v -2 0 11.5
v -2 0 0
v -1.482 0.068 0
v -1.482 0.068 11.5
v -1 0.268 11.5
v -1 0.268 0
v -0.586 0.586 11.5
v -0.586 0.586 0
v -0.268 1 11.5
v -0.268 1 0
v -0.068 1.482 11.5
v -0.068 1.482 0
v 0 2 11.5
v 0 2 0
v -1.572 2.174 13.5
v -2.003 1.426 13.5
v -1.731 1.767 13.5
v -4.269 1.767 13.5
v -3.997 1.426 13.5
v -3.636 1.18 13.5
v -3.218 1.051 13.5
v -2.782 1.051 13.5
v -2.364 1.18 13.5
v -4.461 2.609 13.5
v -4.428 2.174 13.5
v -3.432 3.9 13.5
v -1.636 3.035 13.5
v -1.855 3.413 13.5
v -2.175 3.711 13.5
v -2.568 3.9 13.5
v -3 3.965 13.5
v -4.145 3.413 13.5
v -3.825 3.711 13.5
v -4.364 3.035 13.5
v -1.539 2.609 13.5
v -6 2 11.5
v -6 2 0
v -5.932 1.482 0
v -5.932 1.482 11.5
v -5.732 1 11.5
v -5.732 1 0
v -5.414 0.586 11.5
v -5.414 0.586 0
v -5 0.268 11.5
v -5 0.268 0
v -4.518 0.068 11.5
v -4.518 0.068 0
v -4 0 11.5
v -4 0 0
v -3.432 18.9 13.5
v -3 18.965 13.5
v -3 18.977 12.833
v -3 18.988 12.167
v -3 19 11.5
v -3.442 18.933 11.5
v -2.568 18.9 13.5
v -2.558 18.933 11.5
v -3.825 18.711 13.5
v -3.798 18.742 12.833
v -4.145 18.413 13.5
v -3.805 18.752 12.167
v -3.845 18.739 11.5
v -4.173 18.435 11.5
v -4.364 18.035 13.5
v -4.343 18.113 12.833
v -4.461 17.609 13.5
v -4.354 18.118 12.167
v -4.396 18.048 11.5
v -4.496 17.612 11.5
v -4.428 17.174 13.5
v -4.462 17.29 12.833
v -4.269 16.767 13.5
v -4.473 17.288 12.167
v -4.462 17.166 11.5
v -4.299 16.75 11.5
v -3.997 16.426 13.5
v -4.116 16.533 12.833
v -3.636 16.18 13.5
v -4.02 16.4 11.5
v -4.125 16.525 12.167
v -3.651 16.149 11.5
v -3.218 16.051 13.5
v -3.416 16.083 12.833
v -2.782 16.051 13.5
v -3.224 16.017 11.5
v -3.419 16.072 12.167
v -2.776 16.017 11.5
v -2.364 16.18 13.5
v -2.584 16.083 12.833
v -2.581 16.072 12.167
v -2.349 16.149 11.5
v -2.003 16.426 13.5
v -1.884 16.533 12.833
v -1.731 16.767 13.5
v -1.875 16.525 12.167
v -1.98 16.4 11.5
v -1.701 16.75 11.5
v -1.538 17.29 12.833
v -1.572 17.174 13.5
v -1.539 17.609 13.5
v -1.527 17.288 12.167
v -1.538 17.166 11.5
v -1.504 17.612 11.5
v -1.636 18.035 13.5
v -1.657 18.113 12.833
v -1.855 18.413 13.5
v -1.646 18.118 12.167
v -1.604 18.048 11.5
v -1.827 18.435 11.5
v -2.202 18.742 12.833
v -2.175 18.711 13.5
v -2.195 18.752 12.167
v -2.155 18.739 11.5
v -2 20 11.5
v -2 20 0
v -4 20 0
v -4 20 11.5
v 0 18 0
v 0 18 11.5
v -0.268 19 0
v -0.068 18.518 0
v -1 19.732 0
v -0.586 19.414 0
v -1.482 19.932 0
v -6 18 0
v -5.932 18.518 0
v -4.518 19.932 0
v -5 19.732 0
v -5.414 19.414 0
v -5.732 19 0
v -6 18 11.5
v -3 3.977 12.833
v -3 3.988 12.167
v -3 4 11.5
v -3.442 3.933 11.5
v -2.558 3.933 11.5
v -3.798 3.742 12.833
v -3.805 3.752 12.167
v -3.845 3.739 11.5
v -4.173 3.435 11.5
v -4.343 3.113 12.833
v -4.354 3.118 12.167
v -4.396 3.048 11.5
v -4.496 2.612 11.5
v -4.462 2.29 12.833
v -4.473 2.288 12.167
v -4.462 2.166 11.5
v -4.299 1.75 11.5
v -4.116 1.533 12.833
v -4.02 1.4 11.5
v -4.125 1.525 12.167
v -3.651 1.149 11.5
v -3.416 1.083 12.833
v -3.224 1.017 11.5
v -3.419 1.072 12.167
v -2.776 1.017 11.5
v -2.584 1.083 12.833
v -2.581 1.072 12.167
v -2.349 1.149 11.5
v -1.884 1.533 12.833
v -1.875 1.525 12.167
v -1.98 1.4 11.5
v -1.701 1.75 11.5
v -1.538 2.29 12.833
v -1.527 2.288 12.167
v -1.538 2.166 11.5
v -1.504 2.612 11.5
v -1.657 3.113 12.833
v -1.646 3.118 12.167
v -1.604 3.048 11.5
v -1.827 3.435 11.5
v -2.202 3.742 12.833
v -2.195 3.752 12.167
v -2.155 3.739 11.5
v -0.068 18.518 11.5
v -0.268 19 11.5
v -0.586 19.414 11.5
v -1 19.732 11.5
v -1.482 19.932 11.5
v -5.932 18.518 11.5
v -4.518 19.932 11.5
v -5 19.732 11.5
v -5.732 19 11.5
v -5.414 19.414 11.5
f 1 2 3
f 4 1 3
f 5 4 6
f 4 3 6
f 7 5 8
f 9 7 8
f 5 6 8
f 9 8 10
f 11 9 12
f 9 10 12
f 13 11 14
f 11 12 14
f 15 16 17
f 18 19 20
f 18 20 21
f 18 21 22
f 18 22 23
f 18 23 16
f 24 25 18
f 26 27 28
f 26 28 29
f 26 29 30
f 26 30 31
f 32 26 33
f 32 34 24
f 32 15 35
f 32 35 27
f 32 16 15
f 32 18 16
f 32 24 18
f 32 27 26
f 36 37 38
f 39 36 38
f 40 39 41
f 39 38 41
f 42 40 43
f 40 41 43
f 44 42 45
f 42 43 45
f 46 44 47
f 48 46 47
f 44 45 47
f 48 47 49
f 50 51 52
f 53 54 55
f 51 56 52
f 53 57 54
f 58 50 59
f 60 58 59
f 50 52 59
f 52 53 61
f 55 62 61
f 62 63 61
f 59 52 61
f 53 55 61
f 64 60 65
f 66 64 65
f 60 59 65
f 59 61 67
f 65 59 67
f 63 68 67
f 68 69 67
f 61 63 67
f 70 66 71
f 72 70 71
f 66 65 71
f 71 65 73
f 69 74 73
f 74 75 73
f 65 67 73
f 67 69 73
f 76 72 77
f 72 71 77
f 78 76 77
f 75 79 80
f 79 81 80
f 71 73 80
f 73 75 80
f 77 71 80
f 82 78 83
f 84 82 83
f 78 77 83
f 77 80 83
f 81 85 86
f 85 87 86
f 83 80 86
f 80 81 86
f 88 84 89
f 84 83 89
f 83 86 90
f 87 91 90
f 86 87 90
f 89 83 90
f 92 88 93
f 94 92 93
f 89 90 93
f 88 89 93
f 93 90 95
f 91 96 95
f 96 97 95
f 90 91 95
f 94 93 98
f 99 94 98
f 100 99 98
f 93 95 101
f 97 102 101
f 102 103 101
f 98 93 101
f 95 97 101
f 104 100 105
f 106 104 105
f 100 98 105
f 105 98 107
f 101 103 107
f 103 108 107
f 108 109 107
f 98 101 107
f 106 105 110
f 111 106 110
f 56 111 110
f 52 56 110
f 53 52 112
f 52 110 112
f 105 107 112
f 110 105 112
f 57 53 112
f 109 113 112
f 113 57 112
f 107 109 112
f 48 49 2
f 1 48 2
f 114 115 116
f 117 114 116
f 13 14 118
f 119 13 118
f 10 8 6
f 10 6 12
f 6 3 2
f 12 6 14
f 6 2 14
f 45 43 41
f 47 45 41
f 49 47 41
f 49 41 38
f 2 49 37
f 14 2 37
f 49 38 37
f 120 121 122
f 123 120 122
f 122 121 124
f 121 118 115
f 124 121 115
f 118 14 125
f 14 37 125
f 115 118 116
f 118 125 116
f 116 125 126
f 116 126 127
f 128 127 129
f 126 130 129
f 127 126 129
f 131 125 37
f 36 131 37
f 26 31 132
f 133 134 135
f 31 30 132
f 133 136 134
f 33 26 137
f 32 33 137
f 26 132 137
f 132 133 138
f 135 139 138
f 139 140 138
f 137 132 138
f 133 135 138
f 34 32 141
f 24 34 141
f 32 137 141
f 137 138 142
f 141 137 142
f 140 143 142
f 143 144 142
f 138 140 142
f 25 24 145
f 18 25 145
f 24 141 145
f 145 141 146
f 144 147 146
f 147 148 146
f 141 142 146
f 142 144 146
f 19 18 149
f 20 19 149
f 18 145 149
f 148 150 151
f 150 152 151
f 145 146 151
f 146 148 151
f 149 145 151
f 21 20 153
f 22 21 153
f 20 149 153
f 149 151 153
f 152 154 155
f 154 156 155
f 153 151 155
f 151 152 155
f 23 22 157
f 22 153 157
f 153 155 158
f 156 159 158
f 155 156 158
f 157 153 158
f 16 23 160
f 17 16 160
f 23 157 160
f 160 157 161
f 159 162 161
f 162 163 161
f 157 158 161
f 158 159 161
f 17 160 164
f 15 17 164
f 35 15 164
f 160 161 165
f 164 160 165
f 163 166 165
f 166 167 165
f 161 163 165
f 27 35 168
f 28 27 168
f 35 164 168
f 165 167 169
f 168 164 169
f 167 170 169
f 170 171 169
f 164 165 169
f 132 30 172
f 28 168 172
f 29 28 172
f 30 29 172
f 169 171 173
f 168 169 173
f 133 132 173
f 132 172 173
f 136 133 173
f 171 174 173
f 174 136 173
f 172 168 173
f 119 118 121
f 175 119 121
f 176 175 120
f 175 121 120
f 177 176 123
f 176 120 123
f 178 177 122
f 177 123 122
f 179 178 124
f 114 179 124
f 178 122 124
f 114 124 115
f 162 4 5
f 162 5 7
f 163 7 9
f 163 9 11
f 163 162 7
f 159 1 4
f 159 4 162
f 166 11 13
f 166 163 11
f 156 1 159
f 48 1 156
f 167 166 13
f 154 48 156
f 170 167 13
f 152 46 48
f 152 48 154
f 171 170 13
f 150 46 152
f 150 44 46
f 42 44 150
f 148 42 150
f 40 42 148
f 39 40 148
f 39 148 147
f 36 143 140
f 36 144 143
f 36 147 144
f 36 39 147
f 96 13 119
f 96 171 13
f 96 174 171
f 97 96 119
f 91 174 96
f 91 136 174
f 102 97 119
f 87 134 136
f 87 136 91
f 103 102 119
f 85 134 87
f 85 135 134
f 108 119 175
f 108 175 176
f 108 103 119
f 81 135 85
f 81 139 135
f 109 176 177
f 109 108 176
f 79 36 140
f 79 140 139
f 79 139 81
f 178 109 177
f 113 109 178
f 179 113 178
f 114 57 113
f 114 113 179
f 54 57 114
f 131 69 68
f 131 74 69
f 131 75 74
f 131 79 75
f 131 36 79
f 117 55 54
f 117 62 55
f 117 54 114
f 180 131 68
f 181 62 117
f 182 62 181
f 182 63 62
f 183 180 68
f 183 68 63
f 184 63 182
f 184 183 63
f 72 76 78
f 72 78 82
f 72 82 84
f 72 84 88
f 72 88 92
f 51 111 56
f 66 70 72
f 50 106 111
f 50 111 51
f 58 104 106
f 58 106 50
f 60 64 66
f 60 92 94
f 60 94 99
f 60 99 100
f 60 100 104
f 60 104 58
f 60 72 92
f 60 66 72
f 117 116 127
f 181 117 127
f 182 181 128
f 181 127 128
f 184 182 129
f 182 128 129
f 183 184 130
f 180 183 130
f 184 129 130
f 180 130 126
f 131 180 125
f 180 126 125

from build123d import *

# Parameters (mm, degrees)
BOSS_EXTRUDE1_DEPTH           = 11.5
BOSS_EXTRUDE2_START           = 11.5
SKETCH1_3_R                   = 1.5
BOSS_EXTRUDE2_DEPTH           = 2
BOSS_EXTRUDE2_DRAFT           = 1
BOSS_EXTRUDE2_PROFILE_2_DEPTH = 2
BOSS_EXTRUDE2_PROFILE_2_DRAFT = 1


with BuildPart() as part:
    # Sketch1 → Boss-Extrude1 (new body)
    with BuildSketch(Plane(origin=(0, 0, 0), x_dir=(0, 1, 0), z_dir=(0, 0, 1))):
        with BuildLine():
            Line((2, 0), (18, 0))
            ThreePointArc((18, 0), (19.414213562, 0.585786438), (20, 2))
            Line((20, 2), (20, 4))
            ThreePointArc((20, 4), (19.414213562, 5.414213562), (18, 6))
            Line((18, 6), (2, 6))
            ThreePointArc((2, 6), (0.585786438, 5.414213562), (0, 4))
            Line((0, 4), (0, 2))
            ThreePointArc((0, 2), (0.585786438, 0.585786438), (2, 0))
        make_face()
    extrude(amount=BOSS_EXTRUDE1_DEPTH)


with BuildPart() as boss_extrude2_tool:
    # Sketch1<3> → Boss-Extrude2 (with draft: the straight prism first)
    with BuildSketch(Plane(origin=(0, 0, 0), x_dir=(0, 1, 0), z_dir=(0, 0, 1)).offset(BOSS_EXTRUDE2_START)):
        with Locations((2.5, 3)):
            Circle(SKETCH1_3_R)
    extrude(amount=BOSS_EXTRUDE2_DEPTH)
    # Boss-Extrude2: the draft: its side faces are tilted about the plane it starts from
    boss_extrude2_sides = [boss_extrude2_tool.faces().sort_by_distance(p)[0] for p in [
        (-3, 1, 12.5),
    ]]
    draft(boss_extrude2_sides, Plane(origin=(0, 0, 0), x_dir=(0, 1, 0), z_dir=(0, 0, 1)).offset(BOSS_EXTRUDE2_START), BOSS_EXTRUDE2_DRAFT)


with BuildPart() as part_1:
    add(part.part)

    # Boss-Extrude2: add boss_extrude2_tool
    add(boss_extrude2_tool.part)


with BuildPart() as boss_extrude2_profile_2_tool:
    # Sketch1<3> → Boss-Extrude2 profile 2 (with draft: the straight prism first)
    with BuildSketch(Plane(origin=(0, 0, 0), x_dir=(0, 1, 0), z_dir=(0, 0, 1)).offset(BOSS_EXTRUDE2_START)):
        with Locations((17.5, 3)):
            Circle(SKETCH1_3_R)
    extrude(amount=BOSS_EXTRUDE2_PROFILE_2_DEPTH)
    # Boss-Extrude2 profile 2: the draft: its side faces are tilted about the plane it starts from
    boss_extrude2_profile_2_sides = [boss_extrude2_profile_2_tool.faces().sort_by_distance(p)[0] for p in [
        (-3, 16, 12.5),
    ]]
    draft(boss_extrude2_profile_2_sides, Plane(origin=(0, 0, 0), x_dir=(0, 1, 0), z_dir=(0, 0, 1)).offset(BOSS_EXTRUDE2_START), BOSS_EXTRUDE2_PROFILE_2_DRAFT)


with BuildPart() as part_2:
    add(part_1.part)

    # Boss-Extrude2 profile 2: add boss_extrude2_profile_2_tool
    add(boss_extrude2_profile_2_tool.part)


solid = part_2.part
